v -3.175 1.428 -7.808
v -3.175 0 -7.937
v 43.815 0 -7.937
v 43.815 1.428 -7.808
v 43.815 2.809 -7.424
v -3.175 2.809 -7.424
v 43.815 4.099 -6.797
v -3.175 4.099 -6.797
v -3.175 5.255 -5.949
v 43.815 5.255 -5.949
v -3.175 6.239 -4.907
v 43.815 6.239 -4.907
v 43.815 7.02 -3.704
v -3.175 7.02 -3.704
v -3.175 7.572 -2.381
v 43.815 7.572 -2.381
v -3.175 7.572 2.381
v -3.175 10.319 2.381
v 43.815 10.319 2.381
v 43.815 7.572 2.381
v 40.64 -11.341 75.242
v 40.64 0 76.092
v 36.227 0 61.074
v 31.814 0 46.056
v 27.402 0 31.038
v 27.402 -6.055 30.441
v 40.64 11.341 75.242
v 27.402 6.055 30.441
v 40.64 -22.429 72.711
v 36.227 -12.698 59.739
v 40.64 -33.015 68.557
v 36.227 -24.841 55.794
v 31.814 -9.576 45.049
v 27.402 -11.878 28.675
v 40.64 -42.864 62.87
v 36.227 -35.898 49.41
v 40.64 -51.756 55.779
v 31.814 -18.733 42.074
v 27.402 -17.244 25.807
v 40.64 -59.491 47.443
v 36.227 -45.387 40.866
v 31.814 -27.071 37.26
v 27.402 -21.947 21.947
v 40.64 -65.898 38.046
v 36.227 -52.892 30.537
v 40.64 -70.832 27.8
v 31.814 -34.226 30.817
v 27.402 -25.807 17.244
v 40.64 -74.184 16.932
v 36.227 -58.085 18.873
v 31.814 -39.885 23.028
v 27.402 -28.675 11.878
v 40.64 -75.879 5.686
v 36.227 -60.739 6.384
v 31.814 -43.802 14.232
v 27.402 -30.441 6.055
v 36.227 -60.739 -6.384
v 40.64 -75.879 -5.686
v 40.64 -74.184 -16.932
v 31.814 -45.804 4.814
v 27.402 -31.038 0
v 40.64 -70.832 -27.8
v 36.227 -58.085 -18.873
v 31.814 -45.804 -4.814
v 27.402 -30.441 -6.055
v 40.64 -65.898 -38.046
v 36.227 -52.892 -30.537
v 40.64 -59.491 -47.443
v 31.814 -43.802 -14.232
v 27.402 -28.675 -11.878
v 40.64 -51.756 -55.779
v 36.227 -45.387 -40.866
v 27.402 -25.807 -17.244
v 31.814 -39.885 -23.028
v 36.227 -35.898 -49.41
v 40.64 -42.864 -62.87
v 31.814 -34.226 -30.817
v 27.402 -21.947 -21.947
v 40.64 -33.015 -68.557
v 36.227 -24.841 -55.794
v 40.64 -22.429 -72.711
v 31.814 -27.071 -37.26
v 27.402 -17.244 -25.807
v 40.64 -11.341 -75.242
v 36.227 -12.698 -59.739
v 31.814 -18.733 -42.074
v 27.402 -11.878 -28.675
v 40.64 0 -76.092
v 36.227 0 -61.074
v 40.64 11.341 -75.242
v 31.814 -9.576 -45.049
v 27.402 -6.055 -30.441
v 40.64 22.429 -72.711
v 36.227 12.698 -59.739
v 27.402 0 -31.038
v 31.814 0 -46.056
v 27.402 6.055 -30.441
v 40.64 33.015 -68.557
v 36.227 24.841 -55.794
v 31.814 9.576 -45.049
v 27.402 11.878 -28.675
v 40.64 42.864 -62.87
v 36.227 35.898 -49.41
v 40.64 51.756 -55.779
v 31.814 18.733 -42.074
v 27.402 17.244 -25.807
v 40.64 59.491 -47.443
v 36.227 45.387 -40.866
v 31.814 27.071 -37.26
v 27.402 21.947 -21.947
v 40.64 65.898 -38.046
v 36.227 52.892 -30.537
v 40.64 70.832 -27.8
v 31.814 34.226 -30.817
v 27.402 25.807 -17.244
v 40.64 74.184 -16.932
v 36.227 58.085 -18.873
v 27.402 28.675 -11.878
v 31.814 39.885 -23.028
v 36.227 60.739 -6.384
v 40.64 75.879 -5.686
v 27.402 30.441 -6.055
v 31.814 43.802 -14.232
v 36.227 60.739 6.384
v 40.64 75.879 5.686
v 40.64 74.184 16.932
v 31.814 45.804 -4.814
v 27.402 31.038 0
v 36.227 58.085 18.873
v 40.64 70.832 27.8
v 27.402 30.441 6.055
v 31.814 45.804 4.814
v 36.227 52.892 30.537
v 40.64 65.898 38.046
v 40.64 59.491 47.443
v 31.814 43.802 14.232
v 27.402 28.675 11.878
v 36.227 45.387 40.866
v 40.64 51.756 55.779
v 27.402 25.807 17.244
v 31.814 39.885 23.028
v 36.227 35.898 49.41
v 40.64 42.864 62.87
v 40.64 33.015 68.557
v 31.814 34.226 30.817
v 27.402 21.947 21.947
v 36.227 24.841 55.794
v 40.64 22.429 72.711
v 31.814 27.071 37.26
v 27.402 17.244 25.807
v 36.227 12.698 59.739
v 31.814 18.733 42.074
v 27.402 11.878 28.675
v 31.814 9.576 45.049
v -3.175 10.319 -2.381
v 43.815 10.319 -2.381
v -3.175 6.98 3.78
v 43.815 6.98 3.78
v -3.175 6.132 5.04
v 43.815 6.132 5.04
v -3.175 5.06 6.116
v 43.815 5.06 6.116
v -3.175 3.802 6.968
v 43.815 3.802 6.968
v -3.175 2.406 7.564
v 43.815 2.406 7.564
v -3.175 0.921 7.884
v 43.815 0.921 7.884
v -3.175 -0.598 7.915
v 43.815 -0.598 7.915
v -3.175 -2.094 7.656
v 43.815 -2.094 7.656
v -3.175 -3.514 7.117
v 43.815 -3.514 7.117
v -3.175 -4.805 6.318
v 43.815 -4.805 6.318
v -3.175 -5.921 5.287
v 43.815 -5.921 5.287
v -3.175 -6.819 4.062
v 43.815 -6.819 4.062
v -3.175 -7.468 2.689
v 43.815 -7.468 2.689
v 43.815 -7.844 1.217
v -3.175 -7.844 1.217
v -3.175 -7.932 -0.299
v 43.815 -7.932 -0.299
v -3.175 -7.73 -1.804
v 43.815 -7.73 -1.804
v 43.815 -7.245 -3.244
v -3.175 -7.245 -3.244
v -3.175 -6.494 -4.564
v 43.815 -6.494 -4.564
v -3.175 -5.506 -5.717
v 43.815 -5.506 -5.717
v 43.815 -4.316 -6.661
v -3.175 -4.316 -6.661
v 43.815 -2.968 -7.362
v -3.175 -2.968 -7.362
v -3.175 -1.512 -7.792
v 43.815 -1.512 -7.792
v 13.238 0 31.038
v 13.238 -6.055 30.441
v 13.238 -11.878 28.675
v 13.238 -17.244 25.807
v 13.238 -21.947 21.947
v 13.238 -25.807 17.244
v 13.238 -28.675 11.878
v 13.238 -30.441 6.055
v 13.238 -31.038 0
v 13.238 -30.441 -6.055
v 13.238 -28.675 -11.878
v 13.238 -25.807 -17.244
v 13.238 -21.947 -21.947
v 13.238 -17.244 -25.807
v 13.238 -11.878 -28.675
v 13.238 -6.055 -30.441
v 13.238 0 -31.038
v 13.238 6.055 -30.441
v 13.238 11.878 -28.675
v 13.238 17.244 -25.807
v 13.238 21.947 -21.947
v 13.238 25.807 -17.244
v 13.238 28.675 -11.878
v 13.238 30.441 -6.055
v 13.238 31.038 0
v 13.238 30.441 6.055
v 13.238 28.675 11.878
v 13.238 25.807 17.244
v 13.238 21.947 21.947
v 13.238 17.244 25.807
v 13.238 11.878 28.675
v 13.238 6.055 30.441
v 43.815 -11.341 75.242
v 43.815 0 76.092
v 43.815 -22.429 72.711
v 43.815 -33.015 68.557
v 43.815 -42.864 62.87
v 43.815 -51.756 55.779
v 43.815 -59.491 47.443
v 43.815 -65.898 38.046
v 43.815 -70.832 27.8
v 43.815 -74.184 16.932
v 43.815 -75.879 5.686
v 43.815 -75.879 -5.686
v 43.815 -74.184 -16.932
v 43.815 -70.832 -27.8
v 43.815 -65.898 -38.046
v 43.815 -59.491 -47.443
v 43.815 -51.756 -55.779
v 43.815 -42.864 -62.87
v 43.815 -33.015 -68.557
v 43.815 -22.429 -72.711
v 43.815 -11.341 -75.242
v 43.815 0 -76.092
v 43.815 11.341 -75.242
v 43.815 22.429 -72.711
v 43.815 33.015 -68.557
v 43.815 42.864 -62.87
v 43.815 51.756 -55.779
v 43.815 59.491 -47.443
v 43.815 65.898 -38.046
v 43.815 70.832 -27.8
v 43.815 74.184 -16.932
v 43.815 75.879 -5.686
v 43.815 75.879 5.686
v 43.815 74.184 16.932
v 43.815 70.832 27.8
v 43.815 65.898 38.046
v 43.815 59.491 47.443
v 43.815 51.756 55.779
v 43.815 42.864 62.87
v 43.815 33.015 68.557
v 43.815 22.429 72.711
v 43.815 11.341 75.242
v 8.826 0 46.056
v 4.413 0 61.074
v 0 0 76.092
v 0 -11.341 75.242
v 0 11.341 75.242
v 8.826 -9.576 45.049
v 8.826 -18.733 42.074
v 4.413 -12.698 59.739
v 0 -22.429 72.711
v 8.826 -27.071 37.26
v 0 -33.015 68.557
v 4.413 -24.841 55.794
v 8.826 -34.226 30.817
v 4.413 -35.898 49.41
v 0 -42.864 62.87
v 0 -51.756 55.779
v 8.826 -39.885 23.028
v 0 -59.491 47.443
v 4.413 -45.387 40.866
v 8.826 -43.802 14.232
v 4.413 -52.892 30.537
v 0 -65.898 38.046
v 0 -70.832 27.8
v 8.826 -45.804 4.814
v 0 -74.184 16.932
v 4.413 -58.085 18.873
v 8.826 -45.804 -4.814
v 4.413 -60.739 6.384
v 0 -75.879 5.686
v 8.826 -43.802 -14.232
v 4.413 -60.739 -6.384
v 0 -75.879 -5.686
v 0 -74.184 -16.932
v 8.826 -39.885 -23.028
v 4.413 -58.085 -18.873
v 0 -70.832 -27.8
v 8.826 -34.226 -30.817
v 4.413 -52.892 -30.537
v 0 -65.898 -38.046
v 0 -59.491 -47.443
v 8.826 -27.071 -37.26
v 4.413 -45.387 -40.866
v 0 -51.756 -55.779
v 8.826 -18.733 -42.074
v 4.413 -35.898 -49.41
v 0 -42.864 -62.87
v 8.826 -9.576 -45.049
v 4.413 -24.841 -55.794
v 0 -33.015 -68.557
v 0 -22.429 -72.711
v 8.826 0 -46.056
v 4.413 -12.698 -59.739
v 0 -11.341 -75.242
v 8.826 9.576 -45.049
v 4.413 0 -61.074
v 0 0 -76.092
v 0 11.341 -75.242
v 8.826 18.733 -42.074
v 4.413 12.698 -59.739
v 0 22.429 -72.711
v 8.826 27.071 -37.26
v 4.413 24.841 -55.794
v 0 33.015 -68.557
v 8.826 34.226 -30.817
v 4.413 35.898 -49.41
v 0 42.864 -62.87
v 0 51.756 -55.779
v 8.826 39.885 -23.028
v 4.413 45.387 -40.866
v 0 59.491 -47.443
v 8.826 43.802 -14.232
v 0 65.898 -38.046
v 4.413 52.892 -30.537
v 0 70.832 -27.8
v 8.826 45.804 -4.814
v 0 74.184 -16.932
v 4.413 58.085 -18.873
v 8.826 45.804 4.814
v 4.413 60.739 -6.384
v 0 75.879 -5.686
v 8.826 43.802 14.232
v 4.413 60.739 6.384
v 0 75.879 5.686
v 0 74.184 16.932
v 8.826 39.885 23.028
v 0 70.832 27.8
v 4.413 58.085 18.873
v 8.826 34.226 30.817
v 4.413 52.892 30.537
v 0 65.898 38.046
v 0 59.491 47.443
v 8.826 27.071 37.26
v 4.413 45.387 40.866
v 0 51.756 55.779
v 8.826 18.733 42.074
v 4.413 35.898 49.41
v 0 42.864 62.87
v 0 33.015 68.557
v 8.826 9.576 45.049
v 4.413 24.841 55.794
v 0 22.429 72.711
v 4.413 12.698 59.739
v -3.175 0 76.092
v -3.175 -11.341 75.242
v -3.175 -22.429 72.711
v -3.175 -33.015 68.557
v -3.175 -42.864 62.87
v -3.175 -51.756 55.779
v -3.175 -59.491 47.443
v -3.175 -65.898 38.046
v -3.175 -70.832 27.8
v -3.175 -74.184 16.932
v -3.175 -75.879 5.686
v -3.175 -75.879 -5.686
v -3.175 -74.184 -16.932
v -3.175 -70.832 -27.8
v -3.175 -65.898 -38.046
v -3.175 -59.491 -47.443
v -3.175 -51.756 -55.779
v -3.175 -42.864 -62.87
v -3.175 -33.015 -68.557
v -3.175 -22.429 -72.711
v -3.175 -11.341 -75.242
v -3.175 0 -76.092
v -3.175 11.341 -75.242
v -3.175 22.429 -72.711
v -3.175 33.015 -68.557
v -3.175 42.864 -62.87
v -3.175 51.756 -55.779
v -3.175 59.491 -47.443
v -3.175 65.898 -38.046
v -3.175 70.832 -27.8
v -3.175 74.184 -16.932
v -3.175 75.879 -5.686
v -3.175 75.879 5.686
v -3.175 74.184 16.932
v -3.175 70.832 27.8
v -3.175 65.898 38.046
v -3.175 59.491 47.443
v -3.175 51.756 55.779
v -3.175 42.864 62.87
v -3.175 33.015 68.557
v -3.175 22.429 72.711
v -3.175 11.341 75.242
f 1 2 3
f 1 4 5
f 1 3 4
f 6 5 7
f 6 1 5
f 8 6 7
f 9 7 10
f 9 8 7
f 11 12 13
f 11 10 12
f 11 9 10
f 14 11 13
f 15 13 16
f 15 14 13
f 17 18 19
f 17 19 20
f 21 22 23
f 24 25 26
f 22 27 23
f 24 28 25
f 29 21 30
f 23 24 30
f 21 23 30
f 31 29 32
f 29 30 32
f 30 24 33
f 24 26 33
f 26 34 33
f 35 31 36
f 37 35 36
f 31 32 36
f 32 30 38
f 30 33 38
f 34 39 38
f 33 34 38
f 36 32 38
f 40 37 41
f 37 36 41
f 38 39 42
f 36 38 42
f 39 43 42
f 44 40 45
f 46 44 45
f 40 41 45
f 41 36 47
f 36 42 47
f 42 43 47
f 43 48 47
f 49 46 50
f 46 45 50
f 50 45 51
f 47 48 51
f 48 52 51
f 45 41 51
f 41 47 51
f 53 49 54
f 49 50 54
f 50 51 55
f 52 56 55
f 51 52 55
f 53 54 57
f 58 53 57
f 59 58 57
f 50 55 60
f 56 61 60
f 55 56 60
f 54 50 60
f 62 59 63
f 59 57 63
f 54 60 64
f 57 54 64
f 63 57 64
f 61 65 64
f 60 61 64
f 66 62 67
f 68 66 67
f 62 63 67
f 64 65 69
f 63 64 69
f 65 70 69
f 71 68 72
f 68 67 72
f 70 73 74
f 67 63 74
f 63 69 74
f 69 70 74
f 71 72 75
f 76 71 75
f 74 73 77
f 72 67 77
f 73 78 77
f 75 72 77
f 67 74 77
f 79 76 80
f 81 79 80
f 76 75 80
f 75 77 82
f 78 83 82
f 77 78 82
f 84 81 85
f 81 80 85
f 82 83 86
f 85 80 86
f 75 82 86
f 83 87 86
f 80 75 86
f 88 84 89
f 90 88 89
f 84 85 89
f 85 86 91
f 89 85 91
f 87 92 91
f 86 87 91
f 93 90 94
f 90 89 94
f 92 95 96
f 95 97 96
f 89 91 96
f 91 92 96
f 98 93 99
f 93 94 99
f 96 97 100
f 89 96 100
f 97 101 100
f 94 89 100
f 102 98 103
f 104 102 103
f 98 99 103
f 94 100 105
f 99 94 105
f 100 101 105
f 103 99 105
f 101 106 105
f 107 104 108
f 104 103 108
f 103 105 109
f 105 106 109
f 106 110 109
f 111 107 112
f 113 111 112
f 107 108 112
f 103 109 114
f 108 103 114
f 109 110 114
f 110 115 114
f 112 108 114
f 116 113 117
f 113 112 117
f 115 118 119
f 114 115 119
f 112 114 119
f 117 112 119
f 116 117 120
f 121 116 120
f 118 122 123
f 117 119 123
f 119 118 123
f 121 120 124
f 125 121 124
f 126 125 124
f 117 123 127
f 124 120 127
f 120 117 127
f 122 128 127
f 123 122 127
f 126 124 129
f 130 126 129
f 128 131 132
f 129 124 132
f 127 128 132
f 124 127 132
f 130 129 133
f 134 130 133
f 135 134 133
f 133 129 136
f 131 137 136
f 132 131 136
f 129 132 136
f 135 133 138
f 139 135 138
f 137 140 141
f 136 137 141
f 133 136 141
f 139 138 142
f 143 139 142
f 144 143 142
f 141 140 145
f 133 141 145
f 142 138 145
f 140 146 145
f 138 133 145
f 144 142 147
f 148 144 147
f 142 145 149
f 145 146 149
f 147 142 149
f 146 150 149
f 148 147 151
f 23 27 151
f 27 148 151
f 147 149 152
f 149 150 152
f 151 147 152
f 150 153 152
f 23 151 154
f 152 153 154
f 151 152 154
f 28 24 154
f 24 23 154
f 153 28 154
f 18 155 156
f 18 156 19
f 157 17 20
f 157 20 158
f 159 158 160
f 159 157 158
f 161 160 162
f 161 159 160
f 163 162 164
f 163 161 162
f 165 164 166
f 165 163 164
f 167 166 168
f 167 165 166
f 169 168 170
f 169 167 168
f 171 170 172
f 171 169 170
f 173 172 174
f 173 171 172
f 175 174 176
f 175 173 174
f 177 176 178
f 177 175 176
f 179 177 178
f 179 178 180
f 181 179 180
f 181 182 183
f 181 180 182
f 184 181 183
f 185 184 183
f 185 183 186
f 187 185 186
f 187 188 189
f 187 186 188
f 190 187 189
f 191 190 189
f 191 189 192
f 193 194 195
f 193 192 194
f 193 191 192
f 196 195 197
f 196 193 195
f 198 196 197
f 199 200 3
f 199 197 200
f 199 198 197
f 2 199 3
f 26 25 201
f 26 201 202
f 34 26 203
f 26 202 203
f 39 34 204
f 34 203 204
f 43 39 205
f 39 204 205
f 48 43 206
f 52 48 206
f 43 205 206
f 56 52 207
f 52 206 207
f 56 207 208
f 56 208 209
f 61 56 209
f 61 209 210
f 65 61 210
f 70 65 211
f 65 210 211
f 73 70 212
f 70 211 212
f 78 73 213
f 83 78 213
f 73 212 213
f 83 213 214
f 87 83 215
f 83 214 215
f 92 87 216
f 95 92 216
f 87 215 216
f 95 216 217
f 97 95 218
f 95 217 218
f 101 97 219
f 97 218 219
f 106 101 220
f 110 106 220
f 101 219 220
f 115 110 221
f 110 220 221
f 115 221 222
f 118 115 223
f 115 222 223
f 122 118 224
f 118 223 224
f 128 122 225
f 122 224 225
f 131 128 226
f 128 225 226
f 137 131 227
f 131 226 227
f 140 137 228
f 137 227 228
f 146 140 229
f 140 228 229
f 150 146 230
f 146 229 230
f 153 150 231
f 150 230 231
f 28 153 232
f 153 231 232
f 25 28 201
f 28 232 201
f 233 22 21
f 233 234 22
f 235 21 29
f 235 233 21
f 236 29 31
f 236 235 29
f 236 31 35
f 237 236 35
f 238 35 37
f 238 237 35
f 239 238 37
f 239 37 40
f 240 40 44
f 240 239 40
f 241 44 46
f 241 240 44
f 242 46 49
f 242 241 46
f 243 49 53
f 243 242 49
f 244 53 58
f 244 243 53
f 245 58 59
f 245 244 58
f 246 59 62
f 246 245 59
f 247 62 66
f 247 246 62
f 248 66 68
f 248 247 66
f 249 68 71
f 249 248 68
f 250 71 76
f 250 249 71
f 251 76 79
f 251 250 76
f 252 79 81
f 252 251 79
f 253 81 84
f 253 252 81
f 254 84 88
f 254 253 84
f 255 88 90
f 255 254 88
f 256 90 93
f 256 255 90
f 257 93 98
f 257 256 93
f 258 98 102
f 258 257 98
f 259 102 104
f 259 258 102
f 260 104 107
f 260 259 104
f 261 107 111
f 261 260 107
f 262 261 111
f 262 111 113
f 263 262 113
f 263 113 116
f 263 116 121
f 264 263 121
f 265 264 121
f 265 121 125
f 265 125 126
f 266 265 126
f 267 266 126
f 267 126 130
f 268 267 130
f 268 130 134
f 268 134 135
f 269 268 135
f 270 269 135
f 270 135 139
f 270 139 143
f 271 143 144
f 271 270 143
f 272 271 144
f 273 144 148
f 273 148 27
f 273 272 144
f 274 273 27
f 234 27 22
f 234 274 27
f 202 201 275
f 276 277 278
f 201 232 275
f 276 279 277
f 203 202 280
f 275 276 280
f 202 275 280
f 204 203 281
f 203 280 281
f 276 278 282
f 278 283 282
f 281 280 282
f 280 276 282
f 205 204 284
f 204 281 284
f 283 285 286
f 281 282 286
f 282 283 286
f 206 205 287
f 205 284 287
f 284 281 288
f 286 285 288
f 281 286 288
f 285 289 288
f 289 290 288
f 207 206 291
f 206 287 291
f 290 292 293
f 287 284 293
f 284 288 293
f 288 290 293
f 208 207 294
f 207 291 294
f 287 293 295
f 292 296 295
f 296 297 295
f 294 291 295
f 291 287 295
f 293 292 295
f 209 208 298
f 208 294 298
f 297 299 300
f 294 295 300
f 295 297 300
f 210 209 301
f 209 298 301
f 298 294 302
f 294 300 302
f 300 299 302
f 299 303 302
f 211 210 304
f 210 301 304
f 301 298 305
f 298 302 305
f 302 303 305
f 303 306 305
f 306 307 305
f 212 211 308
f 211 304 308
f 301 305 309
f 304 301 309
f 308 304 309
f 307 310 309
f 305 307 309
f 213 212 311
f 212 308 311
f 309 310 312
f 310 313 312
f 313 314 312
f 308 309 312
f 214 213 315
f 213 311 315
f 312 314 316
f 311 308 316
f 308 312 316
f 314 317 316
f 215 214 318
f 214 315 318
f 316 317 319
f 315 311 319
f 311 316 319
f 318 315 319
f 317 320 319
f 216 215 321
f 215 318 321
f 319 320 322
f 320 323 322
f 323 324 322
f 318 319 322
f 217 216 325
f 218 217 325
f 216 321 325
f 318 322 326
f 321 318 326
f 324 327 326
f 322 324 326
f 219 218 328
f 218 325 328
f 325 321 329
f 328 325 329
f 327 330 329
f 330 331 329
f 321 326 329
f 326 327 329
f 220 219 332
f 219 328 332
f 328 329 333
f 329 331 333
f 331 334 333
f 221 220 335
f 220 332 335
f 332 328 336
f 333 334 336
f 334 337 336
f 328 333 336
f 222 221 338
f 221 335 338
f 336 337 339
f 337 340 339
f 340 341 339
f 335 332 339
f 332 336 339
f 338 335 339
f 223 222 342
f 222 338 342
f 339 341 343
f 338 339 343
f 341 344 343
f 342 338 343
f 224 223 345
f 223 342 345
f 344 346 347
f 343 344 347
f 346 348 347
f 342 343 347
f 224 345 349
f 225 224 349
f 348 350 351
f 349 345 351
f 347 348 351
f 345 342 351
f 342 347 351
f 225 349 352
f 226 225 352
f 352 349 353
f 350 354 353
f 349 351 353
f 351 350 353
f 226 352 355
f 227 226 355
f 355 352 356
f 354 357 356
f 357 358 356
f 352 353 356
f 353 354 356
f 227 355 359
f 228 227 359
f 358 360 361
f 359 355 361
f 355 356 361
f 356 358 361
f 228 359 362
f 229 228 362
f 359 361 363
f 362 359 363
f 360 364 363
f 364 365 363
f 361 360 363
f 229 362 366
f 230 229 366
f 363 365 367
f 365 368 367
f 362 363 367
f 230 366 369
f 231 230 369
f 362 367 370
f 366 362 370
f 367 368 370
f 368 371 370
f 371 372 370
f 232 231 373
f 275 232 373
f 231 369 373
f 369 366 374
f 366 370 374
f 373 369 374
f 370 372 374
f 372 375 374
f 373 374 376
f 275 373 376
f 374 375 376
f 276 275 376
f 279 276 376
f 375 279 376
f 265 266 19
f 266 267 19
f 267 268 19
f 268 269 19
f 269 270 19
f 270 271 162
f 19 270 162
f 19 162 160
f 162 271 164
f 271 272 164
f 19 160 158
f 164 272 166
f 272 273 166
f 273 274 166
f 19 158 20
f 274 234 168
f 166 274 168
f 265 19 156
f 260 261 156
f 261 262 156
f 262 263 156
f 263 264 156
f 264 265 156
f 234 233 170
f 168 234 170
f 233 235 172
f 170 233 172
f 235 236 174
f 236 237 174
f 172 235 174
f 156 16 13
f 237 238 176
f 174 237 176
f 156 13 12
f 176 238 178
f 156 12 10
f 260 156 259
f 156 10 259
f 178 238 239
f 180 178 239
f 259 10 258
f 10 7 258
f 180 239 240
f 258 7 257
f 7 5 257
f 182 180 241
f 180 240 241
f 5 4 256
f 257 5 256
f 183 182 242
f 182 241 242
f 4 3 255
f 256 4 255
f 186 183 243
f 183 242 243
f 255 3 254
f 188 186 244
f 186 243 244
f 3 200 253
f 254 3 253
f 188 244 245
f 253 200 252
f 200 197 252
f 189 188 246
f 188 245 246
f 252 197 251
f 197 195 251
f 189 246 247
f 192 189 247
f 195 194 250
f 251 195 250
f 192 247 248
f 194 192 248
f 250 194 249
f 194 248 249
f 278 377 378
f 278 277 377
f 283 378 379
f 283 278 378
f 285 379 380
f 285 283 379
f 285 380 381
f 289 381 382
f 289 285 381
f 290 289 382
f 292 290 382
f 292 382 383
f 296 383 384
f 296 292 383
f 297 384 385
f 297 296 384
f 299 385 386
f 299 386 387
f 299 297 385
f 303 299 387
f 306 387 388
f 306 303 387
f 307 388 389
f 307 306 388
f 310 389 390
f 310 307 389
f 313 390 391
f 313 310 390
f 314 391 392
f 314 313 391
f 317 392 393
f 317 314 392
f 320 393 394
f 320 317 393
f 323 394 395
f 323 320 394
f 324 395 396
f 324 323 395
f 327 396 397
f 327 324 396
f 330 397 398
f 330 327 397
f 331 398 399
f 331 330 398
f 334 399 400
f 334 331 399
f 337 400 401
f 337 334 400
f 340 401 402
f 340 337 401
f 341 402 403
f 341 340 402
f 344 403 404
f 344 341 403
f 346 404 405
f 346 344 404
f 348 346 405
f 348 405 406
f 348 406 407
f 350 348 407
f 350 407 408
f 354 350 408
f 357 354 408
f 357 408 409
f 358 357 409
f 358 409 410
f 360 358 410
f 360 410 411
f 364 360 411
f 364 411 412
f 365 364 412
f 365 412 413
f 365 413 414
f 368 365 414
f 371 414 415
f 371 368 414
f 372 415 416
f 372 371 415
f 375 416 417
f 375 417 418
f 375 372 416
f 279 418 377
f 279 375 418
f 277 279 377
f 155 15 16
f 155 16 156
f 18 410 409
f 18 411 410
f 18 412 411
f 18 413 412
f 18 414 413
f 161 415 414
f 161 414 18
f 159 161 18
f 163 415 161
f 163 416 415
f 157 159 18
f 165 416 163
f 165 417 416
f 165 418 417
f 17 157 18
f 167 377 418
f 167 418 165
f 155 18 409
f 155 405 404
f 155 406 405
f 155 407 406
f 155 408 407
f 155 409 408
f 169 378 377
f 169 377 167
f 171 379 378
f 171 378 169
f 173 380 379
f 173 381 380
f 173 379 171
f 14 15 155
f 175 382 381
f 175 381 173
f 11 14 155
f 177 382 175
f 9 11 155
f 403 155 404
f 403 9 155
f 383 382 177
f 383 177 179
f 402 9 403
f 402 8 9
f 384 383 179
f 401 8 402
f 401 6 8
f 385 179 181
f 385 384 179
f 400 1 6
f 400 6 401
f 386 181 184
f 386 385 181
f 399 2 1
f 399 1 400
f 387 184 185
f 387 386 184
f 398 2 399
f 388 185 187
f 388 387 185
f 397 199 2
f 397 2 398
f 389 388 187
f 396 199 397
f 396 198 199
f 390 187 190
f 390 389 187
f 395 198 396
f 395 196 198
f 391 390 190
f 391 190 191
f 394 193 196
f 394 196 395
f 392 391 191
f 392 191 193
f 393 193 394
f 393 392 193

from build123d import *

# Parameters (mm, degrees)
SKETCH1_W               = 3.175
SKETCH1_H               = 69.74205
CUT_EXTRUDE1_DEPTH      = 25.146
CUT_EXTRUDE1_DEPTH_BACK = 108.204


with BuildPart() as part:
    # Sketch1 → Revolve1 (revolve)
    with BuildSketch(Plane.XY, mode=Mode.PRIVATE) as revolve1_sk:
        Polygon((13.238453462, 31.037681507), (0, 76.09205), (0, 6.35), (22.013333333, 6.35), (40.64, 6.35), (40.64, 76.09205), (27.401546538, 31.037681507), align=None)
        with Locations((-1.5875, 41.221025)):
            Rectangle(SKETCH1_W, SKETCH1_H)
        with Locations((42.2275, 41.221025)):
            Rectangle(SKETCH1_W, SKETCH1_H)
    revolve(revolve1_sk.sketch.rotate(Axis((0, 0, 0), (1, 0, 0)), 90), axis=Axis((0, 0, 0), (1, 0, 0)))

    # Sketch2 → Cut-Extrude1 (cut, two sides: drawn at the far end of the back side and taken through both)
    with BuildSketch(Plane(origin=(43.815, 0, 0), x_dir=(0, 0, -1), z_dir=(1, 0, 0)).offset(-CUT_EXTRUDE1_DEPTH_BACK)):
        with BuildLine():
            Line((2.38125, 7.571892411), (2.38125, 5.886607549))
            ThreePointArc((2.38125, 5.886607549), (5.265141855, 3.549757914), (6.35, 0))
            ThreePointArc((6.35, 0), (-3.549757914, -5.265141855), (-2.38125, 5.886607549))
            Line((-2.38125, 5.886607549), (-2.38125, 7.571892411))
            ThreePointArc((-2.38125, 7.571892411), (-4.695888328, -6.399417088), (7.9375, 0))
            ThreePointArc((7.9375, 0), (6.399417088, 4.695888328), (2.38125, 7.571892411))
        make_face()
        with BuildLine():
            ThreePointArc((-2.38125, 5.886607549), (0, 6.35), (2.38125, 5.886607549))
            Line((2.38125, 5.886607549), (2.38125, 7.571892411))
            ThreePointArc((2.38125, 7.571892411), (0, 7.9375), (-2.38125, 7.571892411))
            Line((-2.38125, 7.571892411), (-2.38125, 5.886607549))
        make_face()
        with BuildLine():
            ThreePointArc((-2.38125, 7.571892411), (0, 7.9375), (2.38125, 7.571892411))
            Line((2.38125, 7.571892411), (2.38125, 10.31875))
            Line((2.38125, 10.31875), (-2.38125, 10.31875))
            Line((-2.38125, 10.31875), (-2.38125, 7.571892411))
        make_face()
        with BuildLine():
            Line((-2.38125, 5.55625), (2.38125, 5.55625))
            Line((2.38125, 5.55625), (2.38125, 5.886607549))
            ThreePointArc((2.38125, 5.886607549), (0, 6.35), (-2.38125, 5.886607549))
            Line((-2.38125, 5.886607549), (-2.38125, 5.55625))
        make_face()
    extrude(amount=CUT_EXTRUDE1_DEPTH + CUT_EXTRUDE1_DEPTH_BACK, mode=Mode.SUBTRACT)


solid = part.part
